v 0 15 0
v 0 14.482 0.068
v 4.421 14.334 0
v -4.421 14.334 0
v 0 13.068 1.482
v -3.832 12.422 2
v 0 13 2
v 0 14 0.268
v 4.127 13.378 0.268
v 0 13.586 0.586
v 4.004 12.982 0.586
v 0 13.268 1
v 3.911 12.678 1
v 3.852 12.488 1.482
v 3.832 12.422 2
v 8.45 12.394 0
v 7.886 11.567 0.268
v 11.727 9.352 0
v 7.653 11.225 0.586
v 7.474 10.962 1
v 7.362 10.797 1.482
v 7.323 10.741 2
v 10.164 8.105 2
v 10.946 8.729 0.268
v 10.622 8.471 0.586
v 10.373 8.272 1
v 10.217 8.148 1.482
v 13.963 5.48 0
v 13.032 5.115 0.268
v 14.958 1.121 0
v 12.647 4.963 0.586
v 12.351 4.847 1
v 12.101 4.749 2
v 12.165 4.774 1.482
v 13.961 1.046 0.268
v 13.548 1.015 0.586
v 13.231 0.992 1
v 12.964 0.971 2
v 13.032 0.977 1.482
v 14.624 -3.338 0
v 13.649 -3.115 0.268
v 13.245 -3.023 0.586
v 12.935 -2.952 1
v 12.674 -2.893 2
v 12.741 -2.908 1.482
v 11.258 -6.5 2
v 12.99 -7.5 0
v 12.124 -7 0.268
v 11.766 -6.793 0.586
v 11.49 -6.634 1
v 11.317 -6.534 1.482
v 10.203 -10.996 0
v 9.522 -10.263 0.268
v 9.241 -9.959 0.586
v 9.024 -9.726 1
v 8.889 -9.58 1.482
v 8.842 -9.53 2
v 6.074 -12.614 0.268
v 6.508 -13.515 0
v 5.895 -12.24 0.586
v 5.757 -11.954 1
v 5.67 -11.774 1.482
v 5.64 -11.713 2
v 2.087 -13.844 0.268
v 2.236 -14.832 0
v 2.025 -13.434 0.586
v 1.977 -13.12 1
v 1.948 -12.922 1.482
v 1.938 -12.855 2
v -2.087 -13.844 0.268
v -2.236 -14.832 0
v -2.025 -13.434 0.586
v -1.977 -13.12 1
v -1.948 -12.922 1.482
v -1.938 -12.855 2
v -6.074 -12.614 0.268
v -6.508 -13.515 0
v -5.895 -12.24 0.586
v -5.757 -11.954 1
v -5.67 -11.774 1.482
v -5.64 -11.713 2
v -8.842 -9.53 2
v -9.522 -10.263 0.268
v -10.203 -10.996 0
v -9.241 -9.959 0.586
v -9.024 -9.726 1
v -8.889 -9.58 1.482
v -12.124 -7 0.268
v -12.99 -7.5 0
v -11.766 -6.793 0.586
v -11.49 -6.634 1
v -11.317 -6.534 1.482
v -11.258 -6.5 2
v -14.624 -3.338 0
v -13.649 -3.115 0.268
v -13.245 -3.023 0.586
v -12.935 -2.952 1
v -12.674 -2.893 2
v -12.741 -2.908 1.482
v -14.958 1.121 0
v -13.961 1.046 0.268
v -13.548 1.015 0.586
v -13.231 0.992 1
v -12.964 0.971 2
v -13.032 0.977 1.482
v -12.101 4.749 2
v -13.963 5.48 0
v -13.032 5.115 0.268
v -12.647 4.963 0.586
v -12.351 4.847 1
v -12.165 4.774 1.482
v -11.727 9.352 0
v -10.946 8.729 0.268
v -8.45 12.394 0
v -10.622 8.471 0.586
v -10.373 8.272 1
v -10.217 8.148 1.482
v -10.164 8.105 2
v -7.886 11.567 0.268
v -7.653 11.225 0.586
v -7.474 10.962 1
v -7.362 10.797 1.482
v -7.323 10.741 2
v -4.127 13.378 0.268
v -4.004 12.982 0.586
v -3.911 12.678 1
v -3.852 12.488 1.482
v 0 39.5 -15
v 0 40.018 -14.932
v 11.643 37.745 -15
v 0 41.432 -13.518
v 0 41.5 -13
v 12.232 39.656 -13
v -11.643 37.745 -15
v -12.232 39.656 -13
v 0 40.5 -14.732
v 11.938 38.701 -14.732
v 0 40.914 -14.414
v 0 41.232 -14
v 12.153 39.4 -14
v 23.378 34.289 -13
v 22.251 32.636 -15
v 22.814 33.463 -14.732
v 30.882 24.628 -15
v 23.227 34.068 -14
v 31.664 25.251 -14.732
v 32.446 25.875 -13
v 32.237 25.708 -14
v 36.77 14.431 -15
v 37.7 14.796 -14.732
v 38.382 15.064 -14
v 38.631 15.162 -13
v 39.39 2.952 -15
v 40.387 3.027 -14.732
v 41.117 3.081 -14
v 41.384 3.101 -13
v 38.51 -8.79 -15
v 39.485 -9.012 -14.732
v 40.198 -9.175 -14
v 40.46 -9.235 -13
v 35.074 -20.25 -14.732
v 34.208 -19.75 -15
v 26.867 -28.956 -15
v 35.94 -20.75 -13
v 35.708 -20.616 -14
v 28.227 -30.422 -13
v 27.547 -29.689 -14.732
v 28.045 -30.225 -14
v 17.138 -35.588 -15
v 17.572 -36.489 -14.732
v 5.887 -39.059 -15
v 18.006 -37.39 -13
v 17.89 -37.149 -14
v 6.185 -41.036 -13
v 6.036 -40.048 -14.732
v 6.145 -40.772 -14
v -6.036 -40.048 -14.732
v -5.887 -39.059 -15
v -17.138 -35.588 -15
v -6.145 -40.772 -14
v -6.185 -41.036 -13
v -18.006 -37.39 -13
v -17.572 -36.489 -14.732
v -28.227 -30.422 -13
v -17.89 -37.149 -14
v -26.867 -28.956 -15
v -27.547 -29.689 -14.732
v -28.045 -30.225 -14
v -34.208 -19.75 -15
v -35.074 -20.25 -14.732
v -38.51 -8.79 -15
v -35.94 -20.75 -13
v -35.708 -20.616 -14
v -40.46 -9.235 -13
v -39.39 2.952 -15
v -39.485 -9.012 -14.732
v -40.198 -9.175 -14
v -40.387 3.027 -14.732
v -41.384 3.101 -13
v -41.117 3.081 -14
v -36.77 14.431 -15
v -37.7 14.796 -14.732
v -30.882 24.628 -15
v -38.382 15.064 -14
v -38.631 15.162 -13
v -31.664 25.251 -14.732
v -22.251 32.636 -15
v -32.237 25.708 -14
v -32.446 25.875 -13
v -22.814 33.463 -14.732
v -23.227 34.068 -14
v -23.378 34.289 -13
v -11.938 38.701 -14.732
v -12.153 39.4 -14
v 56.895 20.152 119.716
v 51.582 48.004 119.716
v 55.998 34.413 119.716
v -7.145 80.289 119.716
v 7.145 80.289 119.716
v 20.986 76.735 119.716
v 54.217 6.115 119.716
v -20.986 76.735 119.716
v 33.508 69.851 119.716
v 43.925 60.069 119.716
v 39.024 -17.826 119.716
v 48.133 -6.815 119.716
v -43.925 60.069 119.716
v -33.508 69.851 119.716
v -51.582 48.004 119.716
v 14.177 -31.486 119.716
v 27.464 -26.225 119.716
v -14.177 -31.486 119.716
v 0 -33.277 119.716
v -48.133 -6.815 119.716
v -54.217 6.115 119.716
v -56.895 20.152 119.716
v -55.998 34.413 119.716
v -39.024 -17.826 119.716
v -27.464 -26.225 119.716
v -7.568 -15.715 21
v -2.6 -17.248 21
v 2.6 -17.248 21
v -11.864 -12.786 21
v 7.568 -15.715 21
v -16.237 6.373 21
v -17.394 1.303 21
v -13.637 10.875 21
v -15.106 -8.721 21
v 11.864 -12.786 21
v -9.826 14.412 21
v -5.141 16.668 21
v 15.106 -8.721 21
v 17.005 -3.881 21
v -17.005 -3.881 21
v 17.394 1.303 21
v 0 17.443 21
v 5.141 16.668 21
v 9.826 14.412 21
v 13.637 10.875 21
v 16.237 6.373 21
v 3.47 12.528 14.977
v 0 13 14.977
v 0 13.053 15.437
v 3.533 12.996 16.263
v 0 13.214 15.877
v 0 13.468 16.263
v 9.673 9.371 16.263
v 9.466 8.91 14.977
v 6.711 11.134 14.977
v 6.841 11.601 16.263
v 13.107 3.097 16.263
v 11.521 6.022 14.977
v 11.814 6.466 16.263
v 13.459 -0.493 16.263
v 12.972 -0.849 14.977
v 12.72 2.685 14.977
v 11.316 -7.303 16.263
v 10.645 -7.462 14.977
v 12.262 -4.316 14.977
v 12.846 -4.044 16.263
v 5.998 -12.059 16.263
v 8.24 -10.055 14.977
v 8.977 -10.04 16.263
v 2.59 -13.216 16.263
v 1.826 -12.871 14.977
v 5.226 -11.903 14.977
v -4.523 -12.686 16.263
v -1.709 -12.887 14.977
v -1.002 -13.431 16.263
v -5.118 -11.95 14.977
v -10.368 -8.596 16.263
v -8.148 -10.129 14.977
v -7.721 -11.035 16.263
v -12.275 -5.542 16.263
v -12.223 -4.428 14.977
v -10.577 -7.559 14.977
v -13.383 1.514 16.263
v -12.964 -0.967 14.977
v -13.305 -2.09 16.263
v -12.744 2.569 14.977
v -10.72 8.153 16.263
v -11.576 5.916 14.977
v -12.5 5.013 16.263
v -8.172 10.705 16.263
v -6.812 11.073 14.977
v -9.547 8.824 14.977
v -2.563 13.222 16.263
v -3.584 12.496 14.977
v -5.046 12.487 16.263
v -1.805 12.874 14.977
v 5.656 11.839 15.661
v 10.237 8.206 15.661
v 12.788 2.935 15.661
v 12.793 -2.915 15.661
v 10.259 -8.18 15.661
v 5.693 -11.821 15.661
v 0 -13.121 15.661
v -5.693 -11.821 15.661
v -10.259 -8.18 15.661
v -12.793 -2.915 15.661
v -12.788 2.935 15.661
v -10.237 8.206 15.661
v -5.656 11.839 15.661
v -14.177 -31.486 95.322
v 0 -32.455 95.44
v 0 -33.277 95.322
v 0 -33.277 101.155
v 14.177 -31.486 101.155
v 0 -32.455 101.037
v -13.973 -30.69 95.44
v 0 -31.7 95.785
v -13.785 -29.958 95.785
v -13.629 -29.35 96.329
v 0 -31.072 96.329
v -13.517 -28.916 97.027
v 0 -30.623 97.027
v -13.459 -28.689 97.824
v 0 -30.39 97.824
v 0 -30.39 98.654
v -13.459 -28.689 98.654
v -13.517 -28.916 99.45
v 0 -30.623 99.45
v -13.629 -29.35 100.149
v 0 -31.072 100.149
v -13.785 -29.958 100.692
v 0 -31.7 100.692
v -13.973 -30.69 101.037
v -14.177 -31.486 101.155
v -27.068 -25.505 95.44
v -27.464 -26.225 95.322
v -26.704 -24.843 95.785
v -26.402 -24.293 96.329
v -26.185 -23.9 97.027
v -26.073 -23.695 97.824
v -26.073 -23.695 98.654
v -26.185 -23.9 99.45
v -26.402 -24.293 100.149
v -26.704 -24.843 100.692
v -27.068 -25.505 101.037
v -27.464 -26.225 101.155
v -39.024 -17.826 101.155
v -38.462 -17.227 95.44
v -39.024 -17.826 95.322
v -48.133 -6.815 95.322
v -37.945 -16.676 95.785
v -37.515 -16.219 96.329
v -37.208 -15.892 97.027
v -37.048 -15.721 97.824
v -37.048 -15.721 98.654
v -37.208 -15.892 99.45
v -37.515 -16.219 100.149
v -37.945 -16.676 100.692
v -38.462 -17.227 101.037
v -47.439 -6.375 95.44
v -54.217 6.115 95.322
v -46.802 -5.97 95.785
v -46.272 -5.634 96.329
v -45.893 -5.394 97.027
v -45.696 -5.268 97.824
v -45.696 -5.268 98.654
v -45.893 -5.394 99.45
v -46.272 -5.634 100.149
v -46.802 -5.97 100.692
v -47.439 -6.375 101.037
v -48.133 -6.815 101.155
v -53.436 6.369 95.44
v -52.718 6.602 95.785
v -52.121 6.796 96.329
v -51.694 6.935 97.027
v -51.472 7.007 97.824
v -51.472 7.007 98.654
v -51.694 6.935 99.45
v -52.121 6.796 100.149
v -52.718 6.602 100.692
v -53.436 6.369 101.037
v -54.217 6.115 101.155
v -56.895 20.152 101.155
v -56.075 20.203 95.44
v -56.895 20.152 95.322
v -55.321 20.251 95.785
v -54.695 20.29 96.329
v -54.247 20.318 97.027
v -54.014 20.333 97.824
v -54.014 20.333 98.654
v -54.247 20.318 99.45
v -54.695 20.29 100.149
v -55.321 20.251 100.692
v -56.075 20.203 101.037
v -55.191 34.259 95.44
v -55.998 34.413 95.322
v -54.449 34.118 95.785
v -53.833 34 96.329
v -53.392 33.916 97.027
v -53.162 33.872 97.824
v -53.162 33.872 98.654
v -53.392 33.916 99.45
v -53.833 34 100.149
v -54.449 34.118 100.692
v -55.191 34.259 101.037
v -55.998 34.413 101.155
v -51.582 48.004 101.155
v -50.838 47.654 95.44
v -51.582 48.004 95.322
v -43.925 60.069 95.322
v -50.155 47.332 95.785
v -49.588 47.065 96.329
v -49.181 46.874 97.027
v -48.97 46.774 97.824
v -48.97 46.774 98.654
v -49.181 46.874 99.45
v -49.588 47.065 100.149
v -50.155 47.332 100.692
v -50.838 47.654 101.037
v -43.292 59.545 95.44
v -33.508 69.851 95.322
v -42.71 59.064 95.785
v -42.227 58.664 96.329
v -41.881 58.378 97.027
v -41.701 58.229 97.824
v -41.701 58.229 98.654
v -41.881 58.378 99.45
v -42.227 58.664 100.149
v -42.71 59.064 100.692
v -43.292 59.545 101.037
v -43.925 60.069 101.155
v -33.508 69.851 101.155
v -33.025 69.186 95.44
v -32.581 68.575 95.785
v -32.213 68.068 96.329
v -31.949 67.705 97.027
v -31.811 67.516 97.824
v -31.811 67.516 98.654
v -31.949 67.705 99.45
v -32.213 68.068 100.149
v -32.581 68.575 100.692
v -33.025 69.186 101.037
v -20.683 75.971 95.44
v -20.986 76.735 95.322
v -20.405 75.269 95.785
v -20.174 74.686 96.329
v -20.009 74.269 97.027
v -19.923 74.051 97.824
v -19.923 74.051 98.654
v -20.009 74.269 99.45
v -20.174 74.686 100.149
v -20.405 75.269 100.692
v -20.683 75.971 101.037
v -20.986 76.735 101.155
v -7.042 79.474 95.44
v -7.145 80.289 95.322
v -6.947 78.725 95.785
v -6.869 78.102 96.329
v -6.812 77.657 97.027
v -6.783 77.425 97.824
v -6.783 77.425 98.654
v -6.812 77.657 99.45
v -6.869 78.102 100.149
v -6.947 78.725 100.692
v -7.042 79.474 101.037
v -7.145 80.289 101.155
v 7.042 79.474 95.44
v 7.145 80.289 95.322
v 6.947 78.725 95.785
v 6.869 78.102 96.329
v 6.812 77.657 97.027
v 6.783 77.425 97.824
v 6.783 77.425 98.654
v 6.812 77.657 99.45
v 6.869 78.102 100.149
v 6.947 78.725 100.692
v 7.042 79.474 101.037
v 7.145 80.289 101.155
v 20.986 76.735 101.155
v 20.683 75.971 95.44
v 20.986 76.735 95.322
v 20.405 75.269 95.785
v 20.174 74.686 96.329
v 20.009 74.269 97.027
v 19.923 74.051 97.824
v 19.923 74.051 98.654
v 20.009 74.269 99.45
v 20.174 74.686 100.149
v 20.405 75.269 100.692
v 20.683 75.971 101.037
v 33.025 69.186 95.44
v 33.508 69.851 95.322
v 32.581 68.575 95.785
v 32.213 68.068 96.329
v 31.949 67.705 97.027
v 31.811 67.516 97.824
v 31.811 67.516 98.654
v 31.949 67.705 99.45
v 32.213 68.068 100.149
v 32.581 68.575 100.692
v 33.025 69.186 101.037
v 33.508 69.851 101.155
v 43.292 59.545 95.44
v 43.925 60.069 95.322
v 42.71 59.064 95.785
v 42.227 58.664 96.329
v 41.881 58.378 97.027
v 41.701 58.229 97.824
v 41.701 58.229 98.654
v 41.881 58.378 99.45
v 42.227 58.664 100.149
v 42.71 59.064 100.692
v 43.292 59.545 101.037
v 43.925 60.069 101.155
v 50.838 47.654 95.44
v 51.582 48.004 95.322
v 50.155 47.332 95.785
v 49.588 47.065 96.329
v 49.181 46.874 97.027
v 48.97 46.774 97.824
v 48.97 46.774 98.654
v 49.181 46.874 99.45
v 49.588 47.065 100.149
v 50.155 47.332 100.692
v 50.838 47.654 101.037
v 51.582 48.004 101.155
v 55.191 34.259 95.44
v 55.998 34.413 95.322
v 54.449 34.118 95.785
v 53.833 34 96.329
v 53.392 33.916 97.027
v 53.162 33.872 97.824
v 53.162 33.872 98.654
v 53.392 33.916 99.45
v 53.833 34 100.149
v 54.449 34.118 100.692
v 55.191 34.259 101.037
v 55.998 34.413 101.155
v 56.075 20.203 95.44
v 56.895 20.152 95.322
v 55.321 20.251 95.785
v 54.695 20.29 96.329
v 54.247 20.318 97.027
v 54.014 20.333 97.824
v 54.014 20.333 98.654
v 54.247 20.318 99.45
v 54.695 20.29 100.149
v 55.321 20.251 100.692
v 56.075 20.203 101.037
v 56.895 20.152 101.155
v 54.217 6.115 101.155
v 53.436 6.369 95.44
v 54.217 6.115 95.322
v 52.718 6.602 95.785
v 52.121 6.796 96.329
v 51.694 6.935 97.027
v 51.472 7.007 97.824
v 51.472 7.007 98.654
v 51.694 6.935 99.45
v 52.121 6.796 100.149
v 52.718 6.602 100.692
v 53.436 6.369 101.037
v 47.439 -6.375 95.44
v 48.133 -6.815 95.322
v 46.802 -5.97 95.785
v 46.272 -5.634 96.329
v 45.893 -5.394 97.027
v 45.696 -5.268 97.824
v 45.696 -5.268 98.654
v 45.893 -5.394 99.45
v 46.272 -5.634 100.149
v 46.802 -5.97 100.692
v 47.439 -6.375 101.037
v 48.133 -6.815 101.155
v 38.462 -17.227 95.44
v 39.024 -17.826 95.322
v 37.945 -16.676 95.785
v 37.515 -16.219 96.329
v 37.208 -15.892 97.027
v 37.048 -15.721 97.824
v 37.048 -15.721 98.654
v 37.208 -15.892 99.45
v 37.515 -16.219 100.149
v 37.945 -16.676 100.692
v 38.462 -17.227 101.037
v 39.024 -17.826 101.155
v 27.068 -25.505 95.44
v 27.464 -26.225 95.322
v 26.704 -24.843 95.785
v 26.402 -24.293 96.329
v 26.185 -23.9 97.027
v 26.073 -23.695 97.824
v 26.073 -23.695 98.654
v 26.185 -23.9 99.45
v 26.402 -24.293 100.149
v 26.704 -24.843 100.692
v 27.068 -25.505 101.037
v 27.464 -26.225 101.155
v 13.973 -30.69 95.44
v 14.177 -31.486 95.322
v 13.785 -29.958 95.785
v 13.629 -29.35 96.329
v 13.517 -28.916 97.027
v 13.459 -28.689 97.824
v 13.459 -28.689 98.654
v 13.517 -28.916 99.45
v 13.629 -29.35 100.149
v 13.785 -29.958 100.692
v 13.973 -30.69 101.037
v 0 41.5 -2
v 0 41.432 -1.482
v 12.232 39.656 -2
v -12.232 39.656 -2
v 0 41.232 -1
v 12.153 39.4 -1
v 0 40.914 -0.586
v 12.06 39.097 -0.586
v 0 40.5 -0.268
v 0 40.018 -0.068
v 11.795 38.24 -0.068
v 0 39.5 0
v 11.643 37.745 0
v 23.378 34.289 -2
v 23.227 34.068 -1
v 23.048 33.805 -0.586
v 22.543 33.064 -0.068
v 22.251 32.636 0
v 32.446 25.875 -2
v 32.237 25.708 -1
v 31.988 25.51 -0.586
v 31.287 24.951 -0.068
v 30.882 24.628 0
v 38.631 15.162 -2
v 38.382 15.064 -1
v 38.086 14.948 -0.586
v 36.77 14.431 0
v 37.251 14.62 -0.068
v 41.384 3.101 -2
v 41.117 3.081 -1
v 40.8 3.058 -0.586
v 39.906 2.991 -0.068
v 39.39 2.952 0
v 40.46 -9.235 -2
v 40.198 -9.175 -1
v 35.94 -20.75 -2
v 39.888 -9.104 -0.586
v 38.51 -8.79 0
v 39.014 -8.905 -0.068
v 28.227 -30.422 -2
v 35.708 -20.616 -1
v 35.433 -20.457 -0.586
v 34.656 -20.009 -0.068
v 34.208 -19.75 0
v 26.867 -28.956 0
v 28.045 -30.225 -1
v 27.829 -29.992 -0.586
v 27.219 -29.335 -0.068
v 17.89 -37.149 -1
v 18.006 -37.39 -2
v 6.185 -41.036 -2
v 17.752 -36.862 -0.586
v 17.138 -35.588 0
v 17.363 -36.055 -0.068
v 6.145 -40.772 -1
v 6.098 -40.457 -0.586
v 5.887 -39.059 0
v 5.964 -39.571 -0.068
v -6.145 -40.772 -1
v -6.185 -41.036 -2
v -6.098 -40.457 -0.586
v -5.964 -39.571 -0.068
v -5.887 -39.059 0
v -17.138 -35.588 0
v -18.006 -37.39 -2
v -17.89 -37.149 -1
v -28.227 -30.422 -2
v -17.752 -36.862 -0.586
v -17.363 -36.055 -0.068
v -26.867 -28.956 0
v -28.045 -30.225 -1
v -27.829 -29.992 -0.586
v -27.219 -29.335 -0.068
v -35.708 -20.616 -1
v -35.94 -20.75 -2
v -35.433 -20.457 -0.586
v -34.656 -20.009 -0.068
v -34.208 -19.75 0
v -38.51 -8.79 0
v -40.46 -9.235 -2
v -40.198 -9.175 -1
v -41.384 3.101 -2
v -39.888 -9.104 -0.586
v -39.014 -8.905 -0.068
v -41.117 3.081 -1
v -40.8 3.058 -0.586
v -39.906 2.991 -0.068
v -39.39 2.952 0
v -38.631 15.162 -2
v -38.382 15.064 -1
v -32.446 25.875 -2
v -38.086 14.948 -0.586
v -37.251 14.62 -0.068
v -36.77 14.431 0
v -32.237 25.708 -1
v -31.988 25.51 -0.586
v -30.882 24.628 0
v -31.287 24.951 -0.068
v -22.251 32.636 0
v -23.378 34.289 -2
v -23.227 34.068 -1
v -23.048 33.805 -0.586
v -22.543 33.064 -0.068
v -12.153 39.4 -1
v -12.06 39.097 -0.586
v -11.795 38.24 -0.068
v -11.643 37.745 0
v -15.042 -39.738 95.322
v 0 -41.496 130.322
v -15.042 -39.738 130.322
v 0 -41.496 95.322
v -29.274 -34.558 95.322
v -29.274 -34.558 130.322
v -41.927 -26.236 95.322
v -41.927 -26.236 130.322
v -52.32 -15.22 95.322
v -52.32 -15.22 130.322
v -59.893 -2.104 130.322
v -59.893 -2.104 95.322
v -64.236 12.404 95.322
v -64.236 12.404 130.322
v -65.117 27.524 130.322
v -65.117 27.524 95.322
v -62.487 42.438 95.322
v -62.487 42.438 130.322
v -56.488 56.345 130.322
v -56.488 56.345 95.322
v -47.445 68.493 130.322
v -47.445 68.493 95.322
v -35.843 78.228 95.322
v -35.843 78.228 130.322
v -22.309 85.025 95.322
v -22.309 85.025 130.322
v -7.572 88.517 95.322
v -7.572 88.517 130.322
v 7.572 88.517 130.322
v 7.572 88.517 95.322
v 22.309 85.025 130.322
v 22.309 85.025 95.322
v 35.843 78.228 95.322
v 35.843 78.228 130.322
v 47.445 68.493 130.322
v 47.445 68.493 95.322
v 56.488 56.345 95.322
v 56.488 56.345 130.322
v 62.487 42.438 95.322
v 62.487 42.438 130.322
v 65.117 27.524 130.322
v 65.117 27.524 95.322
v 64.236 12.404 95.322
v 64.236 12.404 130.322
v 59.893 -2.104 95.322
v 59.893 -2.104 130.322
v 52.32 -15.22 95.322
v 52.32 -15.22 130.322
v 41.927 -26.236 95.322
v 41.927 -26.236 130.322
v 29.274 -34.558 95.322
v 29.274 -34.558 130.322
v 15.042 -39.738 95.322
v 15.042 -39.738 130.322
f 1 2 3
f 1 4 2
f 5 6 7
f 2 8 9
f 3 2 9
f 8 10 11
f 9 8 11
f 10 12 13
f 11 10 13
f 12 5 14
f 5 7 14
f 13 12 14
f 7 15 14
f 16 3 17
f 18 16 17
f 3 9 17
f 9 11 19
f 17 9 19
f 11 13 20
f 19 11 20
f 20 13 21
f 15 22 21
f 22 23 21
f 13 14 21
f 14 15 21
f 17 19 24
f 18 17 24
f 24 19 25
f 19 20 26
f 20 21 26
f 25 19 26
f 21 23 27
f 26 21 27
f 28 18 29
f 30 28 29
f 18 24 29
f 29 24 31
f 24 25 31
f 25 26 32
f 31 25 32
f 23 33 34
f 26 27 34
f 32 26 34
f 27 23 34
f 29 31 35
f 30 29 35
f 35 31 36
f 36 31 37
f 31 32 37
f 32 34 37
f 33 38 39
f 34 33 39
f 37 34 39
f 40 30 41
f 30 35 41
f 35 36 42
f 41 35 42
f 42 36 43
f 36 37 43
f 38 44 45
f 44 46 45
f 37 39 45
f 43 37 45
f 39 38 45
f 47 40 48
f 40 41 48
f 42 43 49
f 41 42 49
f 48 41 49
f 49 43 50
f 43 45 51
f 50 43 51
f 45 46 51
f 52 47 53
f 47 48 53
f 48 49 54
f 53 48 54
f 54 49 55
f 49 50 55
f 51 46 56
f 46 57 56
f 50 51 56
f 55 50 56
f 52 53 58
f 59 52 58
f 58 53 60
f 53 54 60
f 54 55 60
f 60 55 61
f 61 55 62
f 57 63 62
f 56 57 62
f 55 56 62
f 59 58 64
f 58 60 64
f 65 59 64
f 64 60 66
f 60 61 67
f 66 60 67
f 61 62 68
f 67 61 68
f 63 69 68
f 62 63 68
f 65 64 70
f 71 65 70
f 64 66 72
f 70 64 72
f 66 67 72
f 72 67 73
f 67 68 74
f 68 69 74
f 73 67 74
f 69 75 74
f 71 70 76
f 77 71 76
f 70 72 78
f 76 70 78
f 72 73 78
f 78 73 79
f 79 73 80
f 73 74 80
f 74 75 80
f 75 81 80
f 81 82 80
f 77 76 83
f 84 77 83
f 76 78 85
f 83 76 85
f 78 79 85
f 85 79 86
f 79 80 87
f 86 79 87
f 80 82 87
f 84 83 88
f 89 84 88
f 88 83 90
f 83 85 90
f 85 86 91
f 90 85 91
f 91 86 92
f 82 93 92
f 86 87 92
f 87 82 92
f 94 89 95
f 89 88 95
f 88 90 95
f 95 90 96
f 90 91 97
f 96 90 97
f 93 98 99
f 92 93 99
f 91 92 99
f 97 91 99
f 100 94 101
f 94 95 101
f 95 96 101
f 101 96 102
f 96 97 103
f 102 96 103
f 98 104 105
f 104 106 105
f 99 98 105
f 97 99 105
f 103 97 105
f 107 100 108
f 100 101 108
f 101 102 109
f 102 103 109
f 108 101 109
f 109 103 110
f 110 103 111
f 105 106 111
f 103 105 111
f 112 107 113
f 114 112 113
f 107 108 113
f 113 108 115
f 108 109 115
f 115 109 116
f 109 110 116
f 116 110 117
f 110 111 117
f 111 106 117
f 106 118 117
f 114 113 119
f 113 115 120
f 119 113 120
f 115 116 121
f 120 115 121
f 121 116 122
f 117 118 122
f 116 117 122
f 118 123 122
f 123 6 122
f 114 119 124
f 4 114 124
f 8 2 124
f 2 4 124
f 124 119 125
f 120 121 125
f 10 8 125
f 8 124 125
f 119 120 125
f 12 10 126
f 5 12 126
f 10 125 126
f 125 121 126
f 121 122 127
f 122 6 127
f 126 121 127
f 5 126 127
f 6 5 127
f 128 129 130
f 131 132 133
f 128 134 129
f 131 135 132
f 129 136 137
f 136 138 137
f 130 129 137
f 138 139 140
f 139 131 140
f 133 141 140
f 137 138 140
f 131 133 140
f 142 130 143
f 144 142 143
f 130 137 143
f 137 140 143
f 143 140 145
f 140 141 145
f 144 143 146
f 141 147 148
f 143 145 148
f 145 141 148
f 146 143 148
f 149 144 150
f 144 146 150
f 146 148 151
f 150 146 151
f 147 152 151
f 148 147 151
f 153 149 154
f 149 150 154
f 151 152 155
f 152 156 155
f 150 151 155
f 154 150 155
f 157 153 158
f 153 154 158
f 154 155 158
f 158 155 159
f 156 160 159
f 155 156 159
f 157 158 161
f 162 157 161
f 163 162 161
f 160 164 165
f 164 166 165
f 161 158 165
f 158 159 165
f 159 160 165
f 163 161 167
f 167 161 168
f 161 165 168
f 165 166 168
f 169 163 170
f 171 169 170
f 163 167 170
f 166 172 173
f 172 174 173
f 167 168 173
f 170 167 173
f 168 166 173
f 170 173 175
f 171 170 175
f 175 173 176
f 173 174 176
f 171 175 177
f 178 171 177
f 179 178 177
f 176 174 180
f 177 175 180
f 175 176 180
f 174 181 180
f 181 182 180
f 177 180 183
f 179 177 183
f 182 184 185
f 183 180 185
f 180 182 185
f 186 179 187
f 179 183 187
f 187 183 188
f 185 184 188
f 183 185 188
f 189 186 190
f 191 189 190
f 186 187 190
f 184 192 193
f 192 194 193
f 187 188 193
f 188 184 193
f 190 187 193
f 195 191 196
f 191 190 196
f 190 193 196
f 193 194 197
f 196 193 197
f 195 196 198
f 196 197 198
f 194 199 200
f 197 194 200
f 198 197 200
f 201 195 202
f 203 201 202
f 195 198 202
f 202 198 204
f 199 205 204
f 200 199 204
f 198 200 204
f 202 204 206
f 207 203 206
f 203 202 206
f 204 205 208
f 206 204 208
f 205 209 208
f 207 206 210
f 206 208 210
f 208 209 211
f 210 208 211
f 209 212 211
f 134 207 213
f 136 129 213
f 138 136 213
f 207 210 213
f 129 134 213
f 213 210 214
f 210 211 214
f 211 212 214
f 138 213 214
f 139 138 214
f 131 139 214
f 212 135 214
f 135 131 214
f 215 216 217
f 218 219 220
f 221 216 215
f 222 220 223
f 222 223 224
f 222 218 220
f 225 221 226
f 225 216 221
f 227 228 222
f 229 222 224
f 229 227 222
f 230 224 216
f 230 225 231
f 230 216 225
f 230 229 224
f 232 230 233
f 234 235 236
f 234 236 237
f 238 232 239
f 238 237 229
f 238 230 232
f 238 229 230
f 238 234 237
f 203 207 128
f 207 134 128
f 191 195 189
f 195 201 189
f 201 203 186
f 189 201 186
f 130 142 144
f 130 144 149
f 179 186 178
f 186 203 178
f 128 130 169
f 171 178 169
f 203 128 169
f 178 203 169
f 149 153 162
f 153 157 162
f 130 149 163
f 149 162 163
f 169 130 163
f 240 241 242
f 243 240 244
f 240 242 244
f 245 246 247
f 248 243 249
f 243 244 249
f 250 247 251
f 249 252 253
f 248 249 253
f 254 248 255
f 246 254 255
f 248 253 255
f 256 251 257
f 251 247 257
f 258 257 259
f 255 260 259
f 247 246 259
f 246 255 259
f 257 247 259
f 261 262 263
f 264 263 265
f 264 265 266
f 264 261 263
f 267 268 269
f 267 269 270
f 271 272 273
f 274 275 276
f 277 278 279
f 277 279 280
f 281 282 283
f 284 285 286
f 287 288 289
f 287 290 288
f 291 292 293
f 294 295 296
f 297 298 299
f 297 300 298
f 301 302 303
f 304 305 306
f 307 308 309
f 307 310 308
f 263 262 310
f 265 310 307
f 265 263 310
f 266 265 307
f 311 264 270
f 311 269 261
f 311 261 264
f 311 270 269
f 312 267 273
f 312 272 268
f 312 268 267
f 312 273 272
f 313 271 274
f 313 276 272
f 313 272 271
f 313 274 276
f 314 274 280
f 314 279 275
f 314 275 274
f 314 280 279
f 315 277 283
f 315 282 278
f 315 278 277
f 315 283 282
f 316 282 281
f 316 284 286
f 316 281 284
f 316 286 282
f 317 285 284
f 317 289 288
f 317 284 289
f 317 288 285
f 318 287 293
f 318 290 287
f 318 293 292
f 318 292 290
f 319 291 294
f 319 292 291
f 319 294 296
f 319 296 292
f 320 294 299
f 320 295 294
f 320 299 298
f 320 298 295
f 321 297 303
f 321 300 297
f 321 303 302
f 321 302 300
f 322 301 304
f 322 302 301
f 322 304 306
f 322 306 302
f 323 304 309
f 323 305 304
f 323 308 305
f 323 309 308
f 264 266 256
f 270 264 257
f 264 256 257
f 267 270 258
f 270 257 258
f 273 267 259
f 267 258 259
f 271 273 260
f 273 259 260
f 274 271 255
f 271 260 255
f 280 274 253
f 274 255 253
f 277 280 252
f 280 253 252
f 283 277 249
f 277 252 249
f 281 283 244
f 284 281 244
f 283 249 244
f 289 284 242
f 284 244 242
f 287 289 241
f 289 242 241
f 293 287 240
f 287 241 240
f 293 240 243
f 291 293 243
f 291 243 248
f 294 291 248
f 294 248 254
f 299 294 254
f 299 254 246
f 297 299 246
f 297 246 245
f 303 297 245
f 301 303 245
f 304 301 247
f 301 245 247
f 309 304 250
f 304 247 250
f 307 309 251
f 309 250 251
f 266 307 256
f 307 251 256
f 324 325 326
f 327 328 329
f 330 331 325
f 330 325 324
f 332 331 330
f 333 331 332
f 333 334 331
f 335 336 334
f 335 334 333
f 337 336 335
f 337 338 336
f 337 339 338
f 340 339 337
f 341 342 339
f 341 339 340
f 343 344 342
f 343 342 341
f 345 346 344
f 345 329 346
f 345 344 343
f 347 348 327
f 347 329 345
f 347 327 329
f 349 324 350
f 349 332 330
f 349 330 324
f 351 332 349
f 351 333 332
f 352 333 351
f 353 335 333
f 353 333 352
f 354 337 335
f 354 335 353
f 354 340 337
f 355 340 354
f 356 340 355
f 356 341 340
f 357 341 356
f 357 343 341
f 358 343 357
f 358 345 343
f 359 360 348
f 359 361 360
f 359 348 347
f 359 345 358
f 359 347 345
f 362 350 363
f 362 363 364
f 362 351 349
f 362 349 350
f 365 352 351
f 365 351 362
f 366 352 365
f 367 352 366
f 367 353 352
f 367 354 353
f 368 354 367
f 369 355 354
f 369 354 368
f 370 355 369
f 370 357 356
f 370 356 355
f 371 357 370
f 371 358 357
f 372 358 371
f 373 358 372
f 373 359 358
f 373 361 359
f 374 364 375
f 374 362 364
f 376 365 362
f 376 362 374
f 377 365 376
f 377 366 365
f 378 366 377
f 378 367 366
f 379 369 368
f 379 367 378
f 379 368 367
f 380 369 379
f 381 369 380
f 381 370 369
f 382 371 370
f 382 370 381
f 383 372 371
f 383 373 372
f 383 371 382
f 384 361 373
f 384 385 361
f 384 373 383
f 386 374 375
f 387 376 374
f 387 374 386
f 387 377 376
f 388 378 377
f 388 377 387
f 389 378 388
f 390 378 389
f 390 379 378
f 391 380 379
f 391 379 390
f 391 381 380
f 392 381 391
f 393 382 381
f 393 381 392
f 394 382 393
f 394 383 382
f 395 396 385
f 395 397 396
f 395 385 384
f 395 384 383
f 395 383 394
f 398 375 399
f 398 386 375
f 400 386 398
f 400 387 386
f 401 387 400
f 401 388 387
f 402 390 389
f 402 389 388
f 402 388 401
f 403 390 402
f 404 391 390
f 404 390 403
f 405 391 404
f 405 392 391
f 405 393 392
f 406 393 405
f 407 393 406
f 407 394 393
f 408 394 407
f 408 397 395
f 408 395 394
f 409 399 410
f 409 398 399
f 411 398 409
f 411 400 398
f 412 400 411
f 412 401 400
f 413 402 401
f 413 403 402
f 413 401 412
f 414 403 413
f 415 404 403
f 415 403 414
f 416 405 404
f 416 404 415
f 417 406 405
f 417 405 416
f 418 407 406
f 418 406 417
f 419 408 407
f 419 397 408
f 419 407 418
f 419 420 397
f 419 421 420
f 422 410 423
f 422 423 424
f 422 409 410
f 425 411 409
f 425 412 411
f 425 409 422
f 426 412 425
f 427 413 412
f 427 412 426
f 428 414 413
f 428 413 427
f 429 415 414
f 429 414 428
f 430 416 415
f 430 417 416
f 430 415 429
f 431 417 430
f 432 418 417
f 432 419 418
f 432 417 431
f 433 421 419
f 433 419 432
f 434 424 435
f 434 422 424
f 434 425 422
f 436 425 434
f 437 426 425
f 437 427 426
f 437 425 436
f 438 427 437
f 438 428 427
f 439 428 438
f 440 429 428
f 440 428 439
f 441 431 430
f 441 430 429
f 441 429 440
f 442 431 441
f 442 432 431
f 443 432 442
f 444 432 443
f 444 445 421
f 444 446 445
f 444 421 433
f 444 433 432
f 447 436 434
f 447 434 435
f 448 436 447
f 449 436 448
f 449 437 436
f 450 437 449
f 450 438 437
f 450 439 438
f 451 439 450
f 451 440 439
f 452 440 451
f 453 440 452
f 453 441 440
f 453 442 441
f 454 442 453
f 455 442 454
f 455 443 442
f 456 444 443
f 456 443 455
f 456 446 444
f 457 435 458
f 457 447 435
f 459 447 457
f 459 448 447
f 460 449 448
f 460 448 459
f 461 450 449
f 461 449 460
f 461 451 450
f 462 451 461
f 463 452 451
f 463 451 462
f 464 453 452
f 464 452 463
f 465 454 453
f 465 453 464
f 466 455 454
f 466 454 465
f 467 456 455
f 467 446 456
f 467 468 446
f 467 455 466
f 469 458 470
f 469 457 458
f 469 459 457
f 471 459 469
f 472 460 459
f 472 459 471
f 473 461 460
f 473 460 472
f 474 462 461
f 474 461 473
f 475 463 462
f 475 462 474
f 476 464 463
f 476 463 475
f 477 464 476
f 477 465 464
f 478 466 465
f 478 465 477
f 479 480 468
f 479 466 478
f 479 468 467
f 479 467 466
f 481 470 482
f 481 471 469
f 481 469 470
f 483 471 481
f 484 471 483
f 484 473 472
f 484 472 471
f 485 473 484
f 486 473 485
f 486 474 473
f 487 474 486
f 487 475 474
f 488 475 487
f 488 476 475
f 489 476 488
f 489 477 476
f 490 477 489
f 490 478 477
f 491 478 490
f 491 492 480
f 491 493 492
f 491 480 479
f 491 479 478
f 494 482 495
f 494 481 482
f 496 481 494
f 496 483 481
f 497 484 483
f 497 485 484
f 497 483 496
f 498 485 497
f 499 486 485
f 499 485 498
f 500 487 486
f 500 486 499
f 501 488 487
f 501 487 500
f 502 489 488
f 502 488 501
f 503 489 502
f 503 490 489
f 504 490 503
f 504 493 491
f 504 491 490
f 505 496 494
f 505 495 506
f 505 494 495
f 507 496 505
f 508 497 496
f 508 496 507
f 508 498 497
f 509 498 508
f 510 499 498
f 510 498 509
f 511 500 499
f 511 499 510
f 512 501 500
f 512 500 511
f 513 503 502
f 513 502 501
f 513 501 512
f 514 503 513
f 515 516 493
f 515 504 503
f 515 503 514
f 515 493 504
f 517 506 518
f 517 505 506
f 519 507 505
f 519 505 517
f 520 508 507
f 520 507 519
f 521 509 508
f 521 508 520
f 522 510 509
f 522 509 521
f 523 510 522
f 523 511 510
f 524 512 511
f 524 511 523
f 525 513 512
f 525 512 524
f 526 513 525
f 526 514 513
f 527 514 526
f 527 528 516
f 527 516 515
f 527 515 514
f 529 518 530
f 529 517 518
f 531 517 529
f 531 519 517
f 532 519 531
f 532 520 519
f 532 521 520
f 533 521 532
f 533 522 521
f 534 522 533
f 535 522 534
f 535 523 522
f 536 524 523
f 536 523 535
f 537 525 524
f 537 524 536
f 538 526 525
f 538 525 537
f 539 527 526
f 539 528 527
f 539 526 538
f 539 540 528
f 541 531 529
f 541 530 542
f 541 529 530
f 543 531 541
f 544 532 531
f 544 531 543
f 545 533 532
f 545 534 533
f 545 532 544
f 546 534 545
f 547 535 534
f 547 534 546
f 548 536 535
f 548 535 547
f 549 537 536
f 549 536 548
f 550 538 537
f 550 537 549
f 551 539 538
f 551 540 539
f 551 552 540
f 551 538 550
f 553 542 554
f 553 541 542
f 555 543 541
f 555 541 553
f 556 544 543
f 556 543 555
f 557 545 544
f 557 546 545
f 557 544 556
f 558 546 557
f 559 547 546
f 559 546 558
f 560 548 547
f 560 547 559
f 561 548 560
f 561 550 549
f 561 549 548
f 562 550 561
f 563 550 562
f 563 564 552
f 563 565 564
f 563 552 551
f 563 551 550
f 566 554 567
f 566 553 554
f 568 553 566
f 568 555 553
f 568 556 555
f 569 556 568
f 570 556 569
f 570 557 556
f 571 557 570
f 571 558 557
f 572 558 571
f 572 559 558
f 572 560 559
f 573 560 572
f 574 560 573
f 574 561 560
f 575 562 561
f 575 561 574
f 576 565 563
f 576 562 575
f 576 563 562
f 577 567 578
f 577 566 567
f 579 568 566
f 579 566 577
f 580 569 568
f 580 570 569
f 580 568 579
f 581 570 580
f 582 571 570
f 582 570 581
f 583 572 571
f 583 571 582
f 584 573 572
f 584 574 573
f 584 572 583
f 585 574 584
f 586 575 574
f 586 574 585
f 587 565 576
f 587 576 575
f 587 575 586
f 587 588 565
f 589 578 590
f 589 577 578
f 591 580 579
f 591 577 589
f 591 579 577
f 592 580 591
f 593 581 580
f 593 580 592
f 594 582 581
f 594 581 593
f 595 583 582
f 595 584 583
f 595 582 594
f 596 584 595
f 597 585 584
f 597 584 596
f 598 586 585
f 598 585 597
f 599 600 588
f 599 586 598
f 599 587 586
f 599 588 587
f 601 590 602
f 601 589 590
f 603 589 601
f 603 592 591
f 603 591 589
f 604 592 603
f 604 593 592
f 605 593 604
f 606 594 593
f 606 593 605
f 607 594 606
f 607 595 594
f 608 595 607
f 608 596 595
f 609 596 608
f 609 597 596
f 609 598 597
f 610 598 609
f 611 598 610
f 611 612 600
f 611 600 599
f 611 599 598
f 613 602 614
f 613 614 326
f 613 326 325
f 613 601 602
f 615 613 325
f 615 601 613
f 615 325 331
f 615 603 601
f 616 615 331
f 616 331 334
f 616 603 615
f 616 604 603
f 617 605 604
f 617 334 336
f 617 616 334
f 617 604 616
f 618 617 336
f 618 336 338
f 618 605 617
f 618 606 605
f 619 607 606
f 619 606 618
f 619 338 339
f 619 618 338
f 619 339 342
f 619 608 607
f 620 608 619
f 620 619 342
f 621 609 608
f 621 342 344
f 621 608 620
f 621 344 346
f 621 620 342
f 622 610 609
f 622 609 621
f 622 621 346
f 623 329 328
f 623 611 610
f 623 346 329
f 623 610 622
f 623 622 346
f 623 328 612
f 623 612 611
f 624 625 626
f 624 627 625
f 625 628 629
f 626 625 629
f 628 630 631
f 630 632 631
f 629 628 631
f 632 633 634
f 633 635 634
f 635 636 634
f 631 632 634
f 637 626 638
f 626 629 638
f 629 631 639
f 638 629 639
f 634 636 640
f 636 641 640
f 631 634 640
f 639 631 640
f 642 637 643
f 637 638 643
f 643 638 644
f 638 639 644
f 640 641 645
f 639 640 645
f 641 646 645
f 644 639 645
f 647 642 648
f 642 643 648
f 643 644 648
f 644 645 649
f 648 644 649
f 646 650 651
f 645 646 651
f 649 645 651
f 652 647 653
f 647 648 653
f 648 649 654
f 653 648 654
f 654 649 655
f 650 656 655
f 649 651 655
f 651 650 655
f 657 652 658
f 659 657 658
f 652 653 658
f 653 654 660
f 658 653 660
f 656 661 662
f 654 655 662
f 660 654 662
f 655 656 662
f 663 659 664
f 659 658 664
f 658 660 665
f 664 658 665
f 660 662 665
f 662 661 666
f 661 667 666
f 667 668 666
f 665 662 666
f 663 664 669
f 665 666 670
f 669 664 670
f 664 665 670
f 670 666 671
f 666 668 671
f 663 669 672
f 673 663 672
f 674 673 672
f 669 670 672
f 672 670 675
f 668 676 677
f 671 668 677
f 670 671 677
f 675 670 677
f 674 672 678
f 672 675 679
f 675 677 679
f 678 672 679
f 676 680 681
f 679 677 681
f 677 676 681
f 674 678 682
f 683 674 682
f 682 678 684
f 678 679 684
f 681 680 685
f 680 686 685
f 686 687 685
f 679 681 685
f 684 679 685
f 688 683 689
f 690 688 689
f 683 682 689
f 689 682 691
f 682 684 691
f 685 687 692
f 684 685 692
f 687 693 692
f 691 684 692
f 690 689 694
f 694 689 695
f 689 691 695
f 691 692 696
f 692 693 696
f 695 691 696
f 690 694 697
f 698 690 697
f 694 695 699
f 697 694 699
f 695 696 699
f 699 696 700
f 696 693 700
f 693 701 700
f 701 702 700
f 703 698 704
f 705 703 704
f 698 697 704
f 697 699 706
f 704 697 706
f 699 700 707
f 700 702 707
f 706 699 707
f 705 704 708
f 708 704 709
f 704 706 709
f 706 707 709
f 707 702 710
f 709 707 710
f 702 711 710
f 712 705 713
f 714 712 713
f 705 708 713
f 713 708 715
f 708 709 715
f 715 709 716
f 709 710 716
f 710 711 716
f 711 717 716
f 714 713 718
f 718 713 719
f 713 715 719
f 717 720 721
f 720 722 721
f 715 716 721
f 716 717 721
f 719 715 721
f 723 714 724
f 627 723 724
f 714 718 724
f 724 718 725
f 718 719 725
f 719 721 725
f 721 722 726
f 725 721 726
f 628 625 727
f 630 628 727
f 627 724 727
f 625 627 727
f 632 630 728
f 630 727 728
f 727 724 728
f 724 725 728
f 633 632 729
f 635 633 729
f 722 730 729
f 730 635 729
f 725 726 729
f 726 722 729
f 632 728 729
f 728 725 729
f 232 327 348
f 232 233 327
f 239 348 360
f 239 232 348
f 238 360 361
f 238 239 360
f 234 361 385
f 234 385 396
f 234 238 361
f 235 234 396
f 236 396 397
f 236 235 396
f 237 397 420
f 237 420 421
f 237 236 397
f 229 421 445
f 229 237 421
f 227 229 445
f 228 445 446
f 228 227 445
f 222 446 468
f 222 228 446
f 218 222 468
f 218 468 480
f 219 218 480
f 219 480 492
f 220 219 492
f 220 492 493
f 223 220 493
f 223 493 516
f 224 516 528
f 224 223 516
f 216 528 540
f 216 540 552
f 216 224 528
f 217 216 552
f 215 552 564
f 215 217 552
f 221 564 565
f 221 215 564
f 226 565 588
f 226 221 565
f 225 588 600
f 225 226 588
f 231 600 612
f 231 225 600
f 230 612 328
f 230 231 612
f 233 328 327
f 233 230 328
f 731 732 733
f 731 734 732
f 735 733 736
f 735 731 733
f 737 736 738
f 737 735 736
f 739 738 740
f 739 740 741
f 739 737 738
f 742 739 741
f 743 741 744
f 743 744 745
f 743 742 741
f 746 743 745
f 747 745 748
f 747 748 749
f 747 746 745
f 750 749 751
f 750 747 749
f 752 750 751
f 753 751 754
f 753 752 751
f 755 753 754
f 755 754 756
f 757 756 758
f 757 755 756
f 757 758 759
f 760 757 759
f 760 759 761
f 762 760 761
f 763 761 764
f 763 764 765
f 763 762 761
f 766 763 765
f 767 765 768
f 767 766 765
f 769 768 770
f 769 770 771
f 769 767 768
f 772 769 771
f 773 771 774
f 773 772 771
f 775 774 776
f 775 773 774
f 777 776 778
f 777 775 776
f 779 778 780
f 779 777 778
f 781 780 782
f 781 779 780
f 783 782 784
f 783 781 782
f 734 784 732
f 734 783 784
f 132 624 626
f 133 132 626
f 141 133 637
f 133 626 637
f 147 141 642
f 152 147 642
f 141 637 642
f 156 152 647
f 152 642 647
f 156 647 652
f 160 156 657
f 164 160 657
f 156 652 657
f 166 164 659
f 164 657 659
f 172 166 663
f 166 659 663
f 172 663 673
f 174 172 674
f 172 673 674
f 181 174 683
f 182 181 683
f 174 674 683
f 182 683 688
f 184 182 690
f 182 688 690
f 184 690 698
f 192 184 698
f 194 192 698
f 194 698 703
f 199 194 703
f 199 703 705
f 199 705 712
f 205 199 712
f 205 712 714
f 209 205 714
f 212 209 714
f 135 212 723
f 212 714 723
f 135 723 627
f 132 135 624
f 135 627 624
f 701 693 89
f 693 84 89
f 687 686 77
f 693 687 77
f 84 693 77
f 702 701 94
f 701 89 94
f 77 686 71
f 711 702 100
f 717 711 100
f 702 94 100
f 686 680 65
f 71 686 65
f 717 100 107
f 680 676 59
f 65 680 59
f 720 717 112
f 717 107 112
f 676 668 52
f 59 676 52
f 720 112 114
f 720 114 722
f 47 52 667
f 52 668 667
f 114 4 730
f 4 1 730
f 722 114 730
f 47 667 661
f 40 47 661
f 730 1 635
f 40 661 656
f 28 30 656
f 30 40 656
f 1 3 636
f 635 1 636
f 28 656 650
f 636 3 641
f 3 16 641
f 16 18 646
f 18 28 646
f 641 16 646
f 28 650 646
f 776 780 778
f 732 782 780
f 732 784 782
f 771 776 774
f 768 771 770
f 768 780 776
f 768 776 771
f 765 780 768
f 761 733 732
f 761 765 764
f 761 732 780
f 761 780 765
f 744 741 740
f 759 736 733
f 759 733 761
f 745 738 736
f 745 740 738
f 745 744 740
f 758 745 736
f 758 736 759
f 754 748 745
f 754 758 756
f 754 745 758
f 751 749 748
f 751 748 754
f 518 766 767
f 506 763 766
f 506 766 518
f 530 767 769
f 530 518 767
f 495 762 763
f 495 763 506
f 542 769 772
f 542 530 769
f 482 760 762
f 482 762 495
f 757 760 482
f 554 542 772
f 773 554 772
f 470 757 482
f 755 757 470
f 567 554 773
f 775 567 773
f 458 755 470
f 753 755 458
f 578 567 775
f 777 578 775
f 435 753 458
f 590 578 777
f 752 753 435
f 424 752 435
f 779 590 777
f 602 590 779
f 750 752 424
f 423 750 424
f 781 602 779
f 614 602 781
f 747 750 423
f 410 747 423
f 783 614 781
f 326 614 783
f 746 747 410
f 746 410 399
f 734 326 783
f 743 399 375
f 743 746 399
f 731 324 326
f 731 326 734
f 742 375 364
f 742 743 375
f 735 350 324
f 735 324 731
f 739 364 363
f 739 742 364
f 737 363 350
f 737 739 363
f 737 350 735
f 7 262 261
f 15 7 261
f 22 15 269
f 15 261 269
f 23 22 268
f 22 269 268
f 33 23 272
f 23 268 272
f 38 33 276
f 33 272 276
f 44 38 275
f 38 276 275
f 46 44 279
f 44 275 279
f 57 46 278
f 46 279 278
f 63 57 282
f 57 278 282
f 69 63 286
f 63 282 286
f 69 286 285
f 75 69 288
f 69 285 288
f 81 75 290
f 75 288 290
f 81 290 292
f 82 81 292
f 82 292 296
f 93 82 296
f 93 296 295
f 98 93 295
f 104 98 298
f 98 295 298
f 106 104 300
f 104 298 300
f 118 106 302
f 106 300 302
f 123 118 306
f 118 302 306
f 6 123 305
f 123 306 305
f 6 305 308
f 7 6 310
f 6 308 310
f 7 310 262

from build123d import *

# Parameters (mm, degrees)
F2_R = 2


with BuildPart() as f1:
    # F0 (on Right) → F1 (revolve)
    with BuildSketch(Plane.YZ):
        Polygon((0, 21), (0, 0), (0, -15), (41.5, -15), (41.5, 0), (13, 0), (13, 15.705347), (17.442741, 21), align=None)
    revolve(axis=Axis((0, 0, -22.632297), (0, 0, -1)))

    # F2
    f2_edges = [f1.edges().sort_by_distance(p)[0] for p in [
        (0, -41.5, 0),
        (0, -13, 15.705347),
        (0, -13, 0),
        (0, -41.5, -15),
    ]]
    fillet(f2_edges, radius=F2_R)


with BuildPart() as f4:
    # F3 (on Right) → F4 (revolve)
    with BuildSketch(Plane.YZ):
        with BuildLine():
            Line((23.731066, 119.715914), (23.731066, 130.321972))
            Line((23.731066, 130.321972), (-41.496214, 130.321972))
            Line((-41.496214, 130.321972), (-41.496214, 95.321976))
            Line((-41.496214, 95.321976), (-33.276513, 95.321976))
            ThreePointArc((-33.276513, 95.321976), (-30.359849, 98.23864), (-33.276513, 101.155303))
            Line((-33.276513, 101.155303), (-33.276513, 119.715914))
            Line((-33.276513, 119.715914), (23.731066, 119.715914))
        make_face()
    revolve(axis=Axis((0, 23.731066, 125.018943), (0, 0, -1)))


solid = Compound([f1.part, f4.part])
